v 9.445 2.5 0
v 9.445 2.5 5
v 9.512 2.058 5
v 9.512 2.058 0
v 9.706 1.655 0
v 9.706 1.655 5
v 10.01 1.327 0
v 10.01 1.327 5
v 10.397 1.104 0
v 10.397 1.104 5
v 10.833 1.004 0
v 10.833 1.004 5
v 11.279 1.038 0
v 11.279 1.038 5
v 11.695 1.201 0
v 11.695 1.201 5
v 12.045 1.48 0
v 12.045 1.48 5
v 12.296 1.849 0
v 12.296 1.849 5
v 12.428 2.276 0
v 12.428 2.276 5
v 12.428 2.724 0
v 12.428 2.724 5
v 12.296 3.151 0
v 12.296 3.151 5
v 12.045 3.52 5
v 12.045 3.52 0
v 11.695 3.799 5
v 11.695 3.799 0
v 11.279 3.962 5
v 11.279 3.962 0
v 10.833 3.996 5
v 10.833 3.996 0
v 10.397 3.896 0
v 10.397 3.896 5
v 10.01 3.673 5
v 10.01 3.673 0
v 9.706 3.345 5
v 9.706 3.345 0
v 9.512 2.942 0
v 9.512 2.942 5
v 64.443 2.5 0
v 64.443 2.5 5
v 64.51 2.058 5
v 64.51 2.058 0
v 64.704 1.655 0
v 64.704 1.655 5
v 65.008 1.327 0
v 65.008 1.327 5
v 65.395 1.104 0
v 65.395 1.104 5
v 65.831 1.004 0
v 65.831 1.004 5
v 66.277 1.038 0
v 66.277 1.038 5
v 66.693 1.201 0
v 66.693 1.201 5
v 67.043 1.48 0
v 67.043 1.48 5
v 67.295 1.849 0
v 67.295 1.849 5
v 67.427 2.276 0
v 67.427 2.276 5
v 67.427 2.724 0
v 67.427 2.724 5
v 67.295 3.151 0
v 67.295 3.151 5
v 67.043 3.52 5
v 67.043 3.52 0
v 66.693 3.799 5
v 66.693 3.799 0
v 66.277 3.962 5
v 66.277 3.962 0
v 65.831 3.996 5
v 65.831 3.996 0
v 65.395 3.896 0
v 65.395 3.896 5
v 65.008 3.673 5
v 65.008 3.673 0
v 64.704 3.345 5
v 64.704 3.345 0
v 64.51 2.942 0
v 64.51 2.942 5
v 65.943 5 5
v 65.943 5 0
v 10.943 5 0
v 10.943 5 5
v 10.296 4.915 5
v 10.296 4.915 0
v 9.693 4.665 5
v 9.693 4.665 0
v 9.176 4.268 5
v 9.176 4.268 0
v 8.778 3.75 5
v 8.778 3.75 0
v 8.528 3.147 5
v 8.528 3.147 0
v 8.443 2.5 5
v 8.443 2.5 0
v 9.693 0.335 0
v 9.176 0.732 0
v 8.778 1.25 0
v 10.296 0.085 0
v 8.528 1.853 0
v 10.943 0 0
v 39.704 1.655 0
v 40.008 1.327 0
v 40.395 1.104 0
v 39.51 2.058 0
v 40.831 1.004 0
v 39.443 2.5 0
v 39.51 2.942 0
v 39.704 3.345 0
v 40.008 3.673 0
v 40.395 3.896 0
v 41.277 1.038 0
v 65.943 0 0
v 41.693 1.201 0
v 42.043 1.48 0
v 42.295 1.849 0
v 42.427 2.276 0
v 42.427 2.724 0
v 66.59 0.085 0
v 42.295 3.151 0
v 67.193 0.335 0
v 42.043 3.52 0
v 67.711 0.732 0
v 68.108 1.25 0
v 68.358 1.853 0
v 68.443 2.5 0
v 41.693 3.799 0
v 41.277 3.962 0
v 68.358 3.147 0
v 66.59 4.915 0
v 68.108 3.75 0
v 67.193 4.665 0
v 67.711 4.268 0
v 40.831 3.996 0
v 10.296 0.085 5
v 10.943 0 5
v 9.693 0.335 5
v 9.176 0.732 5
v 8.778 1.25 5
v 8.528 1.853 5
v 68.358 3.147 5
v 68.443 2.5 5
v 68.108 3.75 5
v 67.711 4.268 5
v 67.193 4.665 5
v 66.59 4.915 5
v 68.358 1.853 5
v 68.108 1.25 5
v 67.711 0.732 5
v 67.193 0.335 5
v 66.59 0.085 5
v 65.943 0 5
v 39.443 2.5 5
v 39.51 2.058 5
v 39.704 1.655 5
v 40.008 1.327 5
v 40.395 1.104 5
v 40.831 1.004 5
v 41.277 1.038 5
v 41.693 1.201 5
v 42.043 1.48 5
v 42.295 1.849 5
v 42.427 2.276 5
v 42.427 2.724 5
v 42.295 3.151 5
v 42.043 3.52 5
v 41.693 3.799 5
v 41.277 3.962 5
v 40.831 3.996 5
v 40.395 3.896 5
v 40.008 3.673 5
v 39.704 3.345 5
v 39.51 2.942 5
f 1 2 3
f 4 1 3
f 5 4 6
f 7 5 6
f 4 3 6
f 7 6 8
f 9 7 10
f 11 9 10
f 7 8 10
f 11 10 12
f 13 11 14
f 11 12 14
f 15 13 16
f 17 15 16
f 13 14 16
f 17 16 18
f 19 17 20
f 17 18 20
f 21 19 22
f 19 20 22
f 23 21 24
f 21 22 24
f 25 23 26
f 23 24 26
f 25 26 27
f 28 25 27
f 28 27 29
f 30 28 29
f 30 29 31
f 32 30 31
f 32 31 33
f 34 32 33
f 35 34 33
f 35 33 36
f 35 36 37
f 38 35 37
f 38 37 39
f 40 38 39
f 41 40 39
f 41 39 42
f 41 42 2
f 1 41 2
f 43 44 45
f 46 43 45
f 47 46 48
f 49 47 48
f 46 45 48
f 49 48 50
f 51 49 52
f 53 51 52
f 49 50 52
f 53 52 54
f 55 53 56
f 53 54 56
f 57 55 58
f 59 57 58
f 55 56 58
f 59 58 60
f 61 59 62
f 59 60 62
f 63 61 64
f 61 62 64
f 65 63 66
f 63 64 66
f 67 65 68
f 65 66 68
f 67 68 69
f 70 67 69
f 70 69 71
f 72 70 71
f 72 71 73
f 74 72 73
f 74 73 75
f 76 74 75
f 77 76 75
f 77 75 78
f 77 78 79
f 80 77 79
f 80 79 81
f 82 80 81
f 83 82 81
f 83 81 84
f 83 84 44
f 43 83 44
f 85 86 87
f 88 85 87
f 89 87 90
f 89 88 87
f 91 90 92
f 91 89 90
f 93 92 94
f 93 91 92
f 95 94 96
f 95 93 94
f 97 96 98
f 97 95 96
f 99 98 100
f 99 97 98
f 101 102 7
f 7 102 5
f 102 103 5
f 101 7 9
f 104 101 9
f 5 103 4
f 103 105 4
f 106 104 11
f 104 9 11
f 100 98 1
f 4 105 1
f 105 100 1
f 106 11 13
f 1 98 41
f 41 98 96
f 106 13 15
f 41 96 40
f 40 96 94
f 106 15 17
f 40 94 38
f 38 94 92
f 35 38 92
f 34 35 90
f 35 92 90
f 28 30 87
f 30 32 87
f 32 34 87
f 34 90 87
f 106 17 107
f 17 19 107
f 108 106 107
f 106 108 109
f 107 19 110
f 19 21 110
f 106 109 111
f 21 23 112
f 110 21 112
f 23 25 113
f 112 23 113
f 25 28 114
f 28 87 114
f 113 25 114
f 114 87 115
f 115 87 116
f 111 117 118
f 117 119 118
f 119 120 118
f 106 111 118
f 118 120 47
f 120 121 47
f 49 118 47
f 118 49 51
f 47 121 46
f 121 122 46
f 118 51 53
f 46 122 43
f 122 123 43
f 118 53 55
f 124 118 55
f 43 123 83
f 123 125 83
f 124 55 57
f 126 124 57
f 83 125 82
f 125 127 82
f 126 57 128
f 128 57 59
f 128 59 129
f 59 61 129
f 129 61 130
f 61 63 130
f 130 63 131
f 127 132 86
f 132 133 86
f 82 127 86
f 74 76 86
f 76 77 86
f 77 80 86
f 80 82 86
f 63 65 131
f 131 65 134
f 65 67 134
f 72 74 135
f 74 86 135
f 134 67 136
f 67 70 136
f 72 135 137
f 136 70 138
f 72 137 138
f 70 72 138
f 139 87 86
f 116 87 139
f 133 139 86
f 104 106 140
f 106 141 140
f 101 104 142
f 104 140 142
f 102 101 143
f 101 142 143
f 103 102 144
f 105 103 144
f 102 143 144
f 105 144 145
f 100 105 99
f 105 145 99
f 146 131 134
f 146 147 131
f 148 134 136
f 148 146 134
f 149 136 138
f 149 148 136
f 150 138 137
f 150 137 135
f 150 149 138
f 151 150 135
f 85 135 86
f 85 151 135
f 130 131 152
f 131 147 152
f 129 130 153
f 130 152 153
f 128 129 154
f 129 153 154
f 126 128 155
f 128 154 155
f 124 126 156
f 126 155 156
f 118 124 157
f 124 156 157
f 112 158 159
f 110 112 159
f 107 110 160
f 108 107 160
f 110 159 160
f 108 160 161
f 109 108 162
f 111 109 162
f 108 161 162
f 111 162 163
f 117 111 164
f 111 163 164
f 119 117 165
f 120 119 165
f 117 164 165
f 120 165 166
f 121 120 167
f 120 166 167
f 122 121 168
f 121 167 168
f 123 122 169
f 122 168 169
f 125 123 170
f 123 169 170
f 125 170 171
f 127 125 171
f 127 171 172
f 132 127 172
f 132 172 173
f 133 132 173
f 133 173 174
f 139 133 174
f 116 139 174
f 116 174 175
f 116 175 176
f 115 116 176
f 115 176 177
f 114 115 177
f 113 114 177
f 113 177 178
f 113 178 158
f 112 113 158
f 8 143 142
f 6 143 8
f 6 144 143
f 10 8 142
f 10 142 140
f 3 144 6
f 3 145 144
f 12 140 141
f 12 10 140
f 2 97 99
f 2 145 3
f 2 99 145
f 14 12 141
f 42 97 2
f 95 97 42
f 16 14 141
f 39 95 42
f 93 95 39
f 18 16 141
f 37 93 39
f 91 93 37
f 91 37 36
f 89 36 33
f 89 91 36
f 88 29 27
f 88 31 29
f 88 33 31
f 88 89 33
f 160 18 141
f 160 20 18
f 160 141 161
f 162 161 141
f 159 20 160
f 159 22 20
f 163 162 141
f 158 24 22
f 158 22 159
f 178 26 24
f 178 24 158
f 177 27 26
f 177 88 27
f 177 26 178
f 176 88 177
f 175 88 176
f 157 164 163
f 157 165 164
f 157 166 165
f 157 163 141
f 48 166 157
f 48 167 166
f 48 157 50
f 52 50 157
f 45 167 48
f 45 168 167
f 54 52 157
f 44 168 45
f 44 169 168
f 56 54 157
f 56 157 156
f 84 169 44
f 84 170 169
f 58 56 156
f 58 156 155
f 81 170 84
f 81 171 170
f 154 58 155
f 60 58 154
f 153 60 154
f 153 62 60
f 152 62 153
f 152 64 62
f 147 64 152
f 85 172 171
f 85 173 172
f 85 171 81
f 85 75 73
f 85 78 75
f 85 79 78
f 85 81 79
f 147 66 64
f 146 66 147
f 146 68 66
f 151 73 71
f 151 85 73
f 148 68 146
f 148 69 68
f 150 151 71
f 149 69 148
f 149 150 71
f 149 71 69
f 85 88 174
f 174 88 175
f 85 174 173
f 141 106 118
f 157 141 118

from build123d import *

# Parameters (mm, degrees)
F1_DEPTH = 5
F2_D     = 3
F3_R     = 2.49999


# Not quite as in the source:
# - a fillet or chamfer is up to 0.001 mm smaller than in the source, because OpenCascade refuses the exact size


with BuildPart() as f1:
    # F0 (on Top) → F1 (new body)
    with BuildSketch(Plane.XY):
        Polygon((43.4433006123, 0), (68.4433006123, 0), (68.4433006123, 5), (8.4433006123, 5), (8.4433006123, 0), (40.9433006123, 0), align=None)
    extrude(amount=F1_DEPTH)

    # F2 (through all)
    with Locations(Plane(origin=(0, 0, 0), x_dir=(1, 0, 0), z_dir=(0, 0, -1))):
        with Locations((40.9433006123, -2.5), (65.9433006123, -2.5), (10.9449457377, -2.5)):
            Hole(F2_D / 2)

    # F3 (radius 2.5 in the source; OpenCascade refuses exactly that, so slightly less here)
    f3_edges = [f1.edges().sort_by_distance(p)[0] for p in [
        (8.443301, 0, 2.5),
        (8.443301, 5, 2.5),
        (68.443301, 0, 2.5),
        (68.443301, 5, 2.5),
    ]]
    fillet(f3_edges, radius=F3_R)


solid = f1.part
